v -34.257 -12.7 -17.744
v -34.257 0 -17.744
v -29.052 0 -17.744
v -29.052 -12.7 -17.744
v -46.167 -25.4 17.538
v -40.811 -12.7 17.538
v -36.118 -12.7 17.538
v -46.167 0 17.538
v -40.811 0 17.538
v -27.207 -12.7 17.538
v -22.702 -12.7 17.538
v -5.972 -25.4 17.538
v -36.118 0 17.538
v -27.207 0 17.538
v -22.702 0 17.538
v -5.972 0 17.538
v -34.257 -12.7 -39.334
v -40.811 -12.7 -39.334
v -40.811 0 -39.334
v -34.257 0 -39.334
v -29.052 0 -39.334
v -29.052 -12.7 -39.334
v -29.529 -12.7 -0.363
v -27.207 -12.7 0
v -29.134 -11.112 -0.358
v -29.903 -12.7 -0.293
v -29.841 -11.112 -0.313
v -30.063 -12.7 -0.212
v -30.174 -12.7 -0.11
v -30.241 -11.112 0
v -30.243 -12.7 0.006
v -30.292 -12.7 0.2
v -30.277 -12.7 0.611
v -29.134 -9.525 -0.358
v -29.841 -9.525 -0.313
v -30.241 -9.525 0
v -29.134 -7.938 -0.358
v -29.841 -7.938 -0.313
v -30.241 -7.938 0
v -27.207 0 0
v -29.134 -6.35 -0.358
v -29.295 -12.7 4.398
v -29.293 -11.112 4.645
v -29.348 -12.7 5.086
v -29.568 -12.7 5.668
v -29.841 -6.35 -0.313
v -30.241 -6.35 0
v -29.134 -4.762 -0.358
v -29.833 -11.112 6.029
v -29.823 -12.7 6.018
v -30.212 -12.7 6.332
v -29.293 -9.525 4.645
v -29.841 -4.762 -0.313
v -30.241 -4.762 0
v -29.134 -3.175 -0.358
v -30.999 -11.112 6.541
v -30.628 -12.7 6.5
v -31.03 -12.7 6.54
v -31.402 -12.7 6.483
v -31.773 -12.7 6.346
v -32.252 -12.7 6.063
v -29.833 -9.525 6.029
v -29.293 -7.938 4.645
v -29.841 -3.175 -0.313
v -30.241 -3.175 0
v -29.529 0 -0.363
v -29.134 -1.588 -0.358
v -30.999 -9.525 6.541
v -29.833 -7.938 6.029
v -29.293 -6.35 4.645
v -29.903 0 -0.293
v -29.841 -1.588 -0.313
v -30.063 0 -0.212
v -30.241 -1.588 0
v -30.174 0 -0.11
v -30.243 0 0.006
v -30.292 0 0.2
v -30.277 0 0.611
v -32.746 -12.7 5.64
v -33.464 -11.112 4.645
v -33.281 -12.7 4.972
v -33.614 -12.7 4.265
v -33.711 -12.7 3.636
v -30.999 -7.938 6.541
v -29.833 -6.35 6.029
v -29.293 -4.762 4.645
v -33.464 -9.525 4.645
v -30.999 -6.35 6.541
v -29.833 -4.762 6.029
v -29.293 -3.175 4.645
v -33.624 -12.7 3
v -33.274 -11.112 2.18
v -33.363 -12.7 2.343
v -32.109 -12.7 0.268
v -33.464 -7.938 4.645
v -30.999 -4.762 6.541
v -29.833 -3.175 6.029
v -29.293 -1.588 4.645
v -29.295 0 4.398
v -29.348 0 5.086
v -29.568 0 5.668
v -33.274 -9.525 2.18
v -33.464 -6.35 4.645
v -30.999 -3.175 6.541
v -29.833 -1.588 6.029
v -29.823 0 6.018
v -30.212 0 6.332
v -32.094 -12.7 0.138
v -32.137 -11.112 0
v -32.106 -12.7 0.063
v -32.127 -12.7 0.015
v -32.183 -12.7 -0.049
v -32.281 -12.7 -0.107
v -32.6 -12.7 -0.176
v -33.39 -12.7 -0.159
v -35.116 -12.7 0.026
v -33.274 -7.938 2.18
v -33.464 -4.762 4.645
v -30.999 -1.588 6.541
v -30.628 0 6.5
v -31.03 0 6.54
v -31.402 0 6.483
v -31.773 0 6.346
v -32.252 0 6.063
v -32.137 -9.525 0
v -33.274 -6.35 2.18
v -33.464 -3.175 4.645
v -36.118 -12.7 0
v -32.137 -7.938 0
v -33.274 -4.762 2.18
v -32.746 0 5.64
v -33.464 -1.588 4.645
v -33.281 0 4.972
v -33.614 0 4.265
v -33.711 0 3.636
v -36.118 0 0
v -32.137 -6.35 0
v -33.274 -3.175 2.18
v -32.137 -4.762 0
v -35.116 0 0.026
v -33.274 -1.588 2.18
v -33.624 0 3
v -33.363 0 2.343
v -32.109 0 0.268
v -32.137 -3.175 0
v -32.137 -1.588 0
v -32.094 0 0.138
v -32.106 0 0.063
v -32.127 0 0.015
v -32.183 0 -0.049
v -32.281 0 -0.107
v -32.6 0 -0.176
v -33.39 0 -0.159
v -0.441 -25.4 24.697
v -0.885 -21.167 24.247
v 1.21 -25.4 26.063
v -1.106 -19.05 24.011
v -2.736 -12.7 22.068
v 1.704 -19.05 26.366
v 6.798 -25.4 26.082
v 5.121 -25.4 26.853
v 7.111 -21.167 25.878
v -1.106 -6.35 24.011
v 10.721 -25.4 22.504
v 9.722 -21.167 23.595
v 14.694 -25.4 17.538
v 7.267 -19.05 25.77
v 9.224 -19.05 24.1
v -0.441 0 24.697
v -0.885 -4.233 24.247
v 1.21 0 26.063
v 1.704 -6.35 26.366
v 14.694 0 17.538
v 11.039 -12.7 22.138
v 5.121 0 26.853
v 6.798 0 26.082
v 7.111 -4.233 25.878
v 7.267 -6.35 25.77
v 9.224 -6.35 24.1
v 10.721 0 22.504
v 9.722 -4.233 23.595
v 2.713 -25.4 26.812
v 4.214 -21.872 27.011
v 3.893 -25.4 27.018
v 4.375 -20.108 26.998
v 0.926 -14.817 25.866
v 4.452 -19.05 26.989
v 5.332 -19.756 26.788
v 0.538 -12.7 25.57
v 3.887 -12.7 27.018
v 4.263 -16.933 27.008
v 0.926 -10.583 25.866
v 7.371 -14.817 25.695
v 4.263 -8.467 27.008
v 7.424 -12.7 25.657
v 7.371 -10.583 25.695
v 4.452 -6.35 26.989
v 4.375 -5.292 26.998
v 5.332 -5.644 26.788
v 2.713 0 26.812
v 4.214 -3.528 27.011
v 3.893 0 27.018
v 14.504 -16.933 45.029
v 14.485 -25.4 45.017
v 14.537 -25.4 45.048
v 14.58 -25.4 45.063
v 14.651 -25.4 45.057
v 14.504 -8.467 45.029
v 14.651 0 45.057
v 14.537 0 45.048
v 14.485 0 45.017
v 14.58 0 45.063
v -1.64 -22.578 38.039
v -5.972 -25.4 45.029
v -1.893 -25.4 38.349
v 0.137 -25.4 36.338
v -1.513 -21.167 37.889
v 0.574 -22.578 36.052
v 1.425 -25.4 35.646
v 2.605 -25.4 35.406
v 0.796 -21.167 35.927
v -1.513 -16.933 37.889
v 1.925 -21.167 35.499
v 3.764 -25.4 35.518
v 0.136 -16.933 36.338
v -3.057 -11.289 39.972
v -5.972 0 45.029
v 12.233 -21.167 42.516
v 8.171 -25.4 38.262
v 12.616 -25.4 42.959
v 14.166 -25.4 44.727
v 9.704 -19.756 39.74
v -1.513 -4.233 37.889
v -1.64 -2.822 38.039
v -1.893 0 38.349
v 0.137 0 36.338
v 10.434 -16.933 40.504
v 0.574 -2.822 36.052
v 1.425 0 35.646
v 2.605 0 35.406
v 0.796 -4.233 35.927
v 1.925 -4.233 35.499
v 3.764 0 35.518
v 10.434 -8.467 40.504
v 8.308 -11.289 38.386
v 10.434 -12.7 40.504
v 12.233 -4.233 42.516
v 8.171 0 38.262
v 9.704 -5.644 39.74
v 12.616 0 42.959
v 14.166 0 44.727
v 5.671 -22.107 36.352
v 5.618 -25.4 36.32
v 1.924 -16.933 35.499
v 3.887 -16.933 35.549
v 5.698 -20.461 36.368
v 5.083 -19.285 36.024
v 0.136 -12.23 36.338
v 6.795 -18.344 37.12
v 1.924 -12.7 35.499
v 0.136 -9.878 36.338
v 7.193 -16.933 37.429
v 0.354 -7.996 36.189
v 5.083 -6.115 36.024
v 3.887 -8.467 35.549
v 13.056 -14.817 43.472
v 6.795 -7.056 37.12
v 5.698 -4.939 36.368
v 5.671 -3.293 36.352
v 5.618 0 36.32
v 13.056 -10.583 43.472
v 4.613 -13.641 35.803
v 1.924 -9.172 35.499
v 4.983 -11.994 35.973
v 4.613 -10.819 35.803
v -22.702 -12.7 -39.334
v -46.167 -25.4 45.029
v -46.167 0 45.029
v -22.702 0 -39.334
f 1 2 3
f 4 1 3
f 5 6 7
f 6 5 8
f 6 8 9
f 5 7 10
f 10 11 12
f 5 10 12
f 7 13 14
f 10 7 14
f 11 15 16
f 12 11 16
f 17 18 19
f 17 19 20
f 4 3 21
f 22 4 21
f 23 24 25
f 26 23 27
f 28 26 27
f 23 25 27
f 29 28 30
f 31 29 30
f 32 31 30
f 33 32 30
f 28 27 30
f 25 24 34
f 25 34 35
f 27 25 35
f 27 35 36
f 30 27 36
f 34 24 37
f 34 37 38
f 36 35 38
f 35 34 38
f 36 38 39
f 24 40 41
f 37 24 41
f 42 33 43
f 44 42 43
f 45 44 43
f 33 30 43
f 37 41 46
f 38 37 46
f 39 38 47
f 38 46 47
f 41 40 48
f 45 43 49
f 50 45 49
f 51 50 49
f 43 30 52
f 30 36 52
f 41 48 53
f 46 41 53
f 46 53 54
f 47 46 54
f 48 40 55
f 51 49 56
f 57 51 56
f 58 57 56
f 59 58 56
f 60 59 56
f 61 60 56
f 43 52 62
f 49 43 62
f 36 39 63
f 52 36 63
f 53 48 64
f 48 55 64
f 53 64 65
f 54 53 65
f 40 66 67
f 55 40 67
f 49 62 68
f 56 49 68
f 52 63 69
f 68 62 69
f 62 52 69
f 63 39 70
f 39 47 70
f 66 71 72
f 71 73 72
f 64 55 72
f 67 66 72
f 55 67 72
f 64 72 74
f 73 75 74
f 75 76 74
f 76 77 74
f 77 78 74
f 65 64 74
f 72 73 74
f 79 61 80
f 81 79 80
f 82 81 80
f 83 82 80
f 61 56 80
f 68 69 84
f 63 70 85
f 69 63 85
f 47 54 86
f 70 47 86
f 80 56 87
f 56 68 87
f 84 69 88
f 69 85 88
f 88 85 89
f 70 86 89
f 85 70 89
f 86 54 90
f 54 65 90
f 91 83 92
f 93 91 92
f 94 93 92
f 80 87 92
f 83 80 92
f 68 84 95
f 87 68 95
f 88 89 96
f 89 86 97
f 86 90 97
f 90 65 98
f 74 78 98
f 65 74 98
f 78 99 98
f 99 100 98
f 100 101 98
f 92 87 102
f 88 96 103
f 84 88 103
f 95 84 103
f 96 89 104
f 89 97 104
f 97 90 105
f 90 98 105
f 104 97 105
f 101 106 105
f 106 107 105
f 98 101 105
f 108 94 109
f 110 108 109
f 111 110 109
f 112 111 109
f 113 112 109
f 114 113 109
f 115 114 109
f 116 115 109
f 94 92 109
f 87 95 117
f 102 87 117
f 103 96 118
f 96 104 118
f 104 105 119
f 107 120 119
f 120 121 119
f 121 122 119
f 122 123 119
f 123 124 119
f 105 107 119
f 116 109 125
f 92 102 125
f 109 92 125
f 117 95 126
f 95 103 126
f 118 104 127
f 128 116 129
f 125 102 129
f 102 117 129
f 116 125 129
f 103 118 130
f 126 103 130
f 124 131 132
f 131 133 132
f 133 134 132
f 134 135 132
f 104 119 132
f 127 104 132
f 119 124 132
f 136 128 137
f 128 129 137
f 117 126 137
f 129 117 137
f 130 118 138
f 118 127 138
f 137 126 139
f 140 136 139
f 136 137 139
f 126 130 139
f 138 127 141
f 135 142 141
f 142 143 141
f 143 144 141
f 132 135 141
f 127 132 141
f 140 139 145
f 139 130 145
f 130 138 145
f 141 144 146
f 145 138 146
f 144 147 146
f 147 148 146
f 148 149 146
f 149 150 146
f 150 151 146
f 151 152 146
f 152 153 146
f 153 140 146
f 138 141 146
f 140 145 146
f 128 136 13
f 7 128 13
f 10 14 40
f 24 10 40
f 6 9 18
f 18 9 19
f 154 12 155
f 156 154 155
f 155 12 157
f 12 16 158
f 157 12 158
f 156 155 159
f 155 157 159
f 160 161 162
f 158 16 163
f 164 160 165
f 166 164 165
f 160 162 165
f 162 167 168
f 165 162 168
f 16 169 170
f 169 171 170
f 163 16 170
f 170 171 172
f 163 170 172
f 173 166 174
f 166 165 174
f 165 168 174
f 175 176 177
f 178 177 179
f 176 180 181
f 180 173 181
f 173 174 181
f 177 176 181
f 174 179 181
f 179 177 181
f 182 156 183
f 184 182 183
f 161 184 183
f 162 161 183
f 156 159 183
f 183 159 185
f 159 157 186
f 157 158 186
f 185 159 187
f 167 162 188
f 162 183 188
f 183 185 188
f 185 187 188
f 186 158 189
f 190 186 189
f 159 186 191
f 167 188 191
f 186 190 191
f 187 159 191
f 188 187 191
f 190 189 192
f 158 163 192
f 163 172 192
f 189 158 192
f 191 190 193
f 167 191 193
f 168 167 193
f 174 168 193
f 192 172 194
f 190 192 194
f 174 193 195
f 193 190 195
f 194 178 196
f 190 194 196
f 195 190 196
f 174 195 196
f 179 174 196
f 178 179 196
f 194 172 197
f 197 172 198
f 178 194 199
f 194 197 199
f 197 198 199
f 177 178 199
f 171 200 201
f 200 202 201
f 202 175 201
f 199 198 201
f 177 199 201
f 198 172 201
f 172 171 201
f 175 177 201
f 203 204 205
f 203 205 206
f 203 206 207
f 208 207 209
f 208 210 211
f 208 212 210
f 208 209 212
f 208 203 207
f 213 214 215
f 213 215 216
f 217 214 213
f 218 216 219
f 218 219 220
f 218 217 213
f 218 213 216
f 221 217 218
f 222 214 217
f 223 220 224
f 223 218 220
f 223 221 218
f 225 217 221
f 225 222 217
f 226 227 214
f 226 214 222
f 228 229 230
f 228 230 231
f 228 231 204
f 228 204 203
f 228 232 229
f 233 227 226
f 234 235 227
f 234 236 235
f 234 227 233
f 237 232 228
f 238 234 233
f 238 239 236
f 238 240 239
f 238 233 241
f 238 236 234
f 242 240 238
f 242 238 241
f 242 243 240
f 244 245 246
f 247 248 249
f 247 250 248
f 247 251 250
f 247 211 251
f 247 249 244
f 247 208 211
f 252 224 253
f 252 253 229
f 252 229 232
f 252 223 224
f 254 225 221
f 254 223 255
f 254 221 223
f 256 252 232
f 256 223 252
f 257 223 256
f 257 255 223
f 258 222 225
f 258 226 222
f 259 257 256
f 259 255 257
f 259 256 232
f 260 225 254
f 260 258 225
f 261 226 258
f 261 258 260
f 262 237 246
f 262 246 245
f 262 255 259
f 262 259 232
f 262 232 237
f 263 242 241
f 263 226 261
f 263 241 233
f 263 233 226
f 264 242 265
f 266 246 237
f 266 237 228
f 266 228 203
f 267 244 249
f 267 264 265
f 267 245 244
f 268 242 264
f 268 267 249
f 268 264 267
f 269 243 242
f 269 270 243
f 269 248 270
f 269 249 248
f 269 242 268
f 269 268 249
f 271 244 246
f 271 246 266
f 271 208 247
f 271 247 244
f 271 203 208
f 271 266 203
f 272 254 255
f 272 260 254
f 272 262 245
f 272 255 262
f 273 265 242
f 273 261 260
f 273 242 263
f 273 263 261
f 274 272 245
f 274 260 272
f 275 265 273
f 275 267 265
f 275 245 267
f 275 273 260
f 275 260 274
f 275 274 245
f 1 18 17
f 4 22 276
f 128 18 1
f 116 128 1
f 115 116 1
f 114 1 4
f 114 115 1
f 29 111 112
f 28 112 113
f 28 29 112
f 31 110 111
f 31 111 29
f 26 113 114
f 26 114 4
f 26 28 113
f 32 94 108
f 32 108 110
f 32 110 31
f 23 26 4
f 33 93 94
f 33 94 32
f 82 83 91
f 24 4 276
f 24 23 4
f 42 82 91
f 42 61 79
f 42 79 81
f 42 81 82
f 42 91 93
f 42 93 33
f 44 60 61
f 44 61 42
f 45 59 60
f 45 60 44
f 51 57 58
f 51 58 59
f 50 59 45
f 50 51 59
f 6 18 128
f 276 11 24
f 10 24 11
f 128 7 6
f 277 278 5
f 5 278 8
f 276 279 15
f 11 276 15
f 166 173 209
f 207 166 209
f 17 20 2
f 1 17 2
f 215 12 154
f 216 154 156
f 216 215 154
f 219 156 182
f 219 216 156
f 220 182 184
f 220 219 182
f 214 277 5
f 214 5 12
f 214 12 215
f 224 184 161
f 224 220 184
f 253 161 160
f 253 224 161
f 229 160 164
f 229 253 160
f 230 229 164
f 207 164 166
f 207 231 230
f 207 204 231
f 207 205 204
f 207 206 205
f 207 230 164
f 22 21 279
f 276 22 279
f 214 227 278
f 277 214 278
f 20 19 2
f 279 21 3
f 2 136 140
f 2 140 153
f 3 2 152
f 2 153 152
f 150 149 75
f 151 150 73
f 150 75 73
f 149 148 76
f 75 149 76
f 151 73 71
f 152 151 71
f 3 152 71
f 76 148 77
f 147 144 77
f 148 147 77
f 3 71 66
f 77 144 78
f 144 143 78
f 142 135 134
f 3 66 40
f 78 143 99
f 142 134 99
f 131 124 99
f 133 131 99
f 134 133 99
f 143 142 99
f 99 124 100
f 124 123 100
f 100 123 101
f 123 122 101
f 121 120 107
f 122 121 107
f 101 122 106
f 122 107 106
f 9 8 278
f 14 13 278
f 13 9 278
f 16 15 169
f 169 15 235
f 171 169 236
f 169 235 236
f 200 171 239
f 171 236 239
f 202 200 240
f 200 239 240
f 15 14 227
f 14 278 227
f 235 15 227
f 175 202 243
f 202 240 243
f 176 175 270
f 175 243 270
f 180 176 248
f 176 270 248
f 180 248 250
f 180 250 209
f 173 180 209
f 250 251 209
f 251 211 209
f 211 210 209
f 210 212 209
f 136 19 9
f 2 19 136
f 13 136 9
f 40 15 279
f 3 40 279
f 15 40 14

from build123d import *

# Parameters (mm, degrees)
F1_DEPTH = 25.4
F3_DEPTH = 12.7


with BuildPart() as f1:
    # F0 (on Front) → F1 (new body)
    with BuildSketch(Plane.XZ):
        with BuildLine():
            Line((-5.9723113663, 45.0293272734), (-46.1669079959, 45.0293272734))
            Line((-46.1669079959, 45.0293272734), (-46.1669079959, 17.5377372652))
            Line((-46.1669079959, 17.5377372652), (-5.9723113663, 17.5377372652))
            add(Edge.make_bspline(
                [(-5.9723113663, 17.5377372652), (-2.7421037419, 22.2388113669), (3.7997517849, 31.7594834628), (11.0324224964, 22.3175007577), (14.6937780082, 17.5377372652)],
                knots=[0, 0, 0, 0, 0.4937754451, 1, 1, 1, 1], degree=3))
            Line((14.6937780082, 17.5377372652), (14.6510465513, 45.0568711834))
            add(Edge.make_bspline(
                [(-5.9723113663, 45.0293272734), (-3.1039018596, 39.7353803072), (2.6906778005, 29.0408831168), (14.035828108, 45.0860466111), (14.6176635276, 45.0721417685), (14.6510465513, 45.0568711834)],
                knots=[0, 0, 0, 0, 0.4677545083, 0.944928105, 0.9824927302, 0.9824927302, 0.9824927302, 0.9824927302], degree=3))
        make_face()
    extrude(amount=F1_DEPTH)

    # F2 (on Front) → F3 (join)
    with BuildSketch(Plane.XZ):
        with BuildLine():
            Line((-40.8112728043, -17.1658259542), (-40.8112728043, -39.3341283589))
            Line((-40.8112728043, -39.3341283589), (-34.2571637339, -39.3341283589))
            Line((-34.2571637339, -39.3341283589), (-34.2571637339, -17.7441283589))
            Line((-34.2571637339, -17.7441283589), (-29.0524326225, -17.7441283589))
            Line((-29.0524326225, -17.7441283589), (-29.0524326225, -39.3341283589))
            Line((-29.0524326225, -39.3341283589), (-22.7024326225, -39.3341283589))
            Line((-22.7024326225, -39.3341283589), (-22.7024326225, -17.1658259542))
            Line((-22.7024326225, -17.1658259542), (-22.7024326225, 0))
            Line((-22.7024326225, 0), (-22.7024326225, 17.9169308394))
            Line((-22.7024326225, 17.9169308394), (-27.2071920335, 17.9169308394))
            Line((-27.2071920335, 17.9169308394), (-27.2071920335, 0))
            add(Edge.make_bspline(
                [(-27.2071920335, 0), (-28.5825818847, -0.3177946326), (-31.6773810864, -1.0328723065), (-28.2469905577, 4.7548163588), (-31.0048564618, 7.3974553181), (-33.9624208414, 4.7018522539), (-33.6773839228, 2.2731173072), (-30.9591203554, -0.6389776746), (-34.9429871553, 0.1082431292), (-35.7740289914, 0.0317036785), (-36.1182577908, 0)],
                knots=[0, 0, 0, 0, 0.131934451, 0.2968690174, 0.4178502166, 0.5514286485, 0.6705283065, 0.7893202312, 0.9127335825, 1, 1, 1, 1], degree=3))
            Line((-36.1182577908, 0), (-36.1182577908, 17.9169308394))
            Line((-36.1182577908, 17.9169308394), (-40.8112728043, 17.9169308394))
            Line((-40.8112728043, 17.9169308394), (-40.8112728043, 0))
            Line((-40.8112728043, 0), (-40.8112728043, -17.1658259542))
        make_face()
    extrude(amount=F3_DEPTH)


solid = f1.part
